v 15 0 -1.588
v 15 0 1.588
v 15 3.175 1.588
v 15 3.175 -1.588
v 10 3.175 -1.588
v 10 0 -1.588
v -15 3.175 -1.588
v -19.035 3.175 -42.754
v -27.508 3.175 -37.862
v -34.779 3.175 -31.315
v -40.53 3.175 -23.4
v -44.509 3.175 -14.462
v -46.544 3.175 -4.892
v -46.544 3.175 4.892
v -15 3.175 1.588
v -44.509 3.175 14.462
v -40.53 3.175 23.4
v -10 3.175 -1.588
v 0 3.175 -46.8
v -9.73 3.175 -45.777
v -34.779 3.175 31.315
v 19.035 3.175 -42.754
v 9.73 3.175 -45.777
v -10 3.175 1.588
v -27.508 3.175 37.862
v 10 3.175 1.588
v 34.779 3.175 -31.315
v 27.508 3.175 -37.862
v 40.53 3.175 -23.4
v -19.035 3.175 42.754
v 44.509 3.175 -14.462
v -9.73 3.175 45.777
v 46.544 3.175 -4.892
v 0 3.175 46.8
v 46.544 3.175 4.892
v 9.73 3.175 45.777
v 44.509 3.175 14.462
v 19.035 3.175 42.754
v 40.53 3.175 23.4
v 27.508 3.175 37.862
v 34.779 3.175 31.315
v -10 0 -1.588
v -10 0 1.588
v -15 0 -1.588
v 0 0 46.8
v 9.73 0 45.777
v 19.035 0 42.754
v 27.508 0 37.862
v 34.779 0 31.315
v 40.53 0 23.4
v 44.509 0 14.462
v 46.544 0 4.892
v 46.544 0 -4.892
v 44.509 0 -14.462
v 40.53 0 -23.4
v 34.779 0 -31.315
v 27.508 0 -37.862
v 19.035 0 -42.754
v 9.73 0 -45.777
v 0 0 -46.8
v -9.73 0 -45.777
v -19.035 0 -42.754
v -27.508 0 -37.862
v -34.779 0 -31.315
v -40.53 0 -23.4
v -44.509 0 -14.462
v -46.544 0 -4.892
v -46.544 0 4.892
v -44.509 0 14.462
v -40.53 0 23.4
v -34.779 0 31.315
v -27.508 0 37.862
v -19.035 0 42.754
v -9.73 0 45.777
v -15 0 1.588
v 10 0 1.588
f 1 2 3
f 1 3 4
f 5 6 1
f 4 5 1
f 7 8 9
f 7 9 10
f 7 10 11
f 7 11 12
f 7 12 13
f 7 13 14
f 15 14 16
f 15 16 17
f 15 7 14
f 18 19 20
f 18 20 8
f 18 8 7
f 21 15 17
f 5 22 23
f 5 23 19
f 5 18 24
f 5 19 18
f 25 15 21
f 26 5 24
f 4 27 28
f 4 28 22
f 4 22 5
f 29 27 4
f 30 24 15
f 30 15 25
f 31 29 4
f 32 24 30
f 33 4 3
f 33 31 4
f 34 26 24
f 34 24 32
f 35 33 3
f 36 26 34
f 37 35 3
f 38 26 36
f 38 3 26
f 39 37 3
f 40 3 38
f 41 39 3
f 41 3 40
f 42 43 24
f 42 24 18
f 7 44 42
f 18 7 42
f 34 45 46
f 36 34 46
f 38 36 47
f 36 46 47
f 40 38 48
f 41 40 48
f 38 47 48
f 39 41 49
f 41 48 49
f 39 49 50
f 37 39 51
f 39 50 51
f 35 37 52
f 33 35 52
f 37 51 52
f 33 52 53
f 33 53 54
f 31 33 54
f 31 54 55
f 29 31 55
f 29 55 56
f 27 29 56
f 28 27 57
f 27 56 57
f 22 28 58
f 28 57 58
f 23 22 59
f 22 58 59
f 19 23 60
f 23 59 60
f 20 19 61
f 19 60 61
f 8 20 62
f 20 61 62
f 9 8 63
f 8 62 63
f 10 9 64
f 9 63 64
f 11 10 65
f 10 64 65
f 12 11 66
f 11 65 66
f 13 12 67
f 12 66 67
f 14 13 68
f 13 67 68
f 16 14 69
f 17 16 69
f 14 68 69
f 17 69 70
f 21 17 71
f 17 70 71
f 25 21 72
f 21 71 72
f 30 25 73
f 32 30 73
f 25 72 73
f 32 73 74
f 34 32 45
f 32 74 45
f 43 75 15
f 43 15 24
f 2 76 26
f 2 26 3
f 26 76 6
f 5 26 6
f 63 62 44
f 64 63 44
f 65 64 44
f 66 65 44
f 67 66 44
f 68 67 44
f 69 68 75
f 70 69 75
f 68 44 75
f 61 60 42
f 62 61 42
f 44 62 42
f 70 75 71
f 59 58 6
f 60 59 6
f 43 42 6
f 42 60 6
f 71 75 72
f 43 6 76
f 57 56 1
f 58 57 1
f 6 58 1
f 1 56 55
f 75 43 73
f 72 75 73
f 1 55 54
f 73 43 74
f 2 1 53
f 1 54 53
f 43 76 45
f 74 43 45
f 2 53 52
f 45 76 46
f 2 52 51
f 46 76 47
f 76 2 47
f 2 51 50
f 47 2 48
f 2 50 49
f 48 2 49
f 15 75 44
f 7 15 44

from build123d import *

# Parameters (mm, degrees)
SKETCH1_R           = 46.8
SKETCH1_W           = 5
SKETCH1_H           = 3.175
BOSS_EXTRUDE1_DEPTH = 3.175


with BuildPart() as part:
    # Sketch1 → Boss-Extrude1 (new body)
    with BuildSketch(Plane(origin=(0, 0, 0), x_dir=(1, 0, 0), z_dir=(0, 1, 0))):
        with Locations(Location((0, 0, 0), (0, 0, 270))):
            Circle(SKETCH1_R)
        with Locations((-12.5, 0)):
            Rectangle(SKETCH1_W, SKETCH1_H, mode=Mode.SUBTRACT)
        with Locations((12.5, 0)):
            Rectangle(SKETCH1_W, SKETCH1_H, mode=Mode.SUBTRACT)
    extrude(amount=BOSS_EXTRUDE1_DEPTH)


solid = part.part
